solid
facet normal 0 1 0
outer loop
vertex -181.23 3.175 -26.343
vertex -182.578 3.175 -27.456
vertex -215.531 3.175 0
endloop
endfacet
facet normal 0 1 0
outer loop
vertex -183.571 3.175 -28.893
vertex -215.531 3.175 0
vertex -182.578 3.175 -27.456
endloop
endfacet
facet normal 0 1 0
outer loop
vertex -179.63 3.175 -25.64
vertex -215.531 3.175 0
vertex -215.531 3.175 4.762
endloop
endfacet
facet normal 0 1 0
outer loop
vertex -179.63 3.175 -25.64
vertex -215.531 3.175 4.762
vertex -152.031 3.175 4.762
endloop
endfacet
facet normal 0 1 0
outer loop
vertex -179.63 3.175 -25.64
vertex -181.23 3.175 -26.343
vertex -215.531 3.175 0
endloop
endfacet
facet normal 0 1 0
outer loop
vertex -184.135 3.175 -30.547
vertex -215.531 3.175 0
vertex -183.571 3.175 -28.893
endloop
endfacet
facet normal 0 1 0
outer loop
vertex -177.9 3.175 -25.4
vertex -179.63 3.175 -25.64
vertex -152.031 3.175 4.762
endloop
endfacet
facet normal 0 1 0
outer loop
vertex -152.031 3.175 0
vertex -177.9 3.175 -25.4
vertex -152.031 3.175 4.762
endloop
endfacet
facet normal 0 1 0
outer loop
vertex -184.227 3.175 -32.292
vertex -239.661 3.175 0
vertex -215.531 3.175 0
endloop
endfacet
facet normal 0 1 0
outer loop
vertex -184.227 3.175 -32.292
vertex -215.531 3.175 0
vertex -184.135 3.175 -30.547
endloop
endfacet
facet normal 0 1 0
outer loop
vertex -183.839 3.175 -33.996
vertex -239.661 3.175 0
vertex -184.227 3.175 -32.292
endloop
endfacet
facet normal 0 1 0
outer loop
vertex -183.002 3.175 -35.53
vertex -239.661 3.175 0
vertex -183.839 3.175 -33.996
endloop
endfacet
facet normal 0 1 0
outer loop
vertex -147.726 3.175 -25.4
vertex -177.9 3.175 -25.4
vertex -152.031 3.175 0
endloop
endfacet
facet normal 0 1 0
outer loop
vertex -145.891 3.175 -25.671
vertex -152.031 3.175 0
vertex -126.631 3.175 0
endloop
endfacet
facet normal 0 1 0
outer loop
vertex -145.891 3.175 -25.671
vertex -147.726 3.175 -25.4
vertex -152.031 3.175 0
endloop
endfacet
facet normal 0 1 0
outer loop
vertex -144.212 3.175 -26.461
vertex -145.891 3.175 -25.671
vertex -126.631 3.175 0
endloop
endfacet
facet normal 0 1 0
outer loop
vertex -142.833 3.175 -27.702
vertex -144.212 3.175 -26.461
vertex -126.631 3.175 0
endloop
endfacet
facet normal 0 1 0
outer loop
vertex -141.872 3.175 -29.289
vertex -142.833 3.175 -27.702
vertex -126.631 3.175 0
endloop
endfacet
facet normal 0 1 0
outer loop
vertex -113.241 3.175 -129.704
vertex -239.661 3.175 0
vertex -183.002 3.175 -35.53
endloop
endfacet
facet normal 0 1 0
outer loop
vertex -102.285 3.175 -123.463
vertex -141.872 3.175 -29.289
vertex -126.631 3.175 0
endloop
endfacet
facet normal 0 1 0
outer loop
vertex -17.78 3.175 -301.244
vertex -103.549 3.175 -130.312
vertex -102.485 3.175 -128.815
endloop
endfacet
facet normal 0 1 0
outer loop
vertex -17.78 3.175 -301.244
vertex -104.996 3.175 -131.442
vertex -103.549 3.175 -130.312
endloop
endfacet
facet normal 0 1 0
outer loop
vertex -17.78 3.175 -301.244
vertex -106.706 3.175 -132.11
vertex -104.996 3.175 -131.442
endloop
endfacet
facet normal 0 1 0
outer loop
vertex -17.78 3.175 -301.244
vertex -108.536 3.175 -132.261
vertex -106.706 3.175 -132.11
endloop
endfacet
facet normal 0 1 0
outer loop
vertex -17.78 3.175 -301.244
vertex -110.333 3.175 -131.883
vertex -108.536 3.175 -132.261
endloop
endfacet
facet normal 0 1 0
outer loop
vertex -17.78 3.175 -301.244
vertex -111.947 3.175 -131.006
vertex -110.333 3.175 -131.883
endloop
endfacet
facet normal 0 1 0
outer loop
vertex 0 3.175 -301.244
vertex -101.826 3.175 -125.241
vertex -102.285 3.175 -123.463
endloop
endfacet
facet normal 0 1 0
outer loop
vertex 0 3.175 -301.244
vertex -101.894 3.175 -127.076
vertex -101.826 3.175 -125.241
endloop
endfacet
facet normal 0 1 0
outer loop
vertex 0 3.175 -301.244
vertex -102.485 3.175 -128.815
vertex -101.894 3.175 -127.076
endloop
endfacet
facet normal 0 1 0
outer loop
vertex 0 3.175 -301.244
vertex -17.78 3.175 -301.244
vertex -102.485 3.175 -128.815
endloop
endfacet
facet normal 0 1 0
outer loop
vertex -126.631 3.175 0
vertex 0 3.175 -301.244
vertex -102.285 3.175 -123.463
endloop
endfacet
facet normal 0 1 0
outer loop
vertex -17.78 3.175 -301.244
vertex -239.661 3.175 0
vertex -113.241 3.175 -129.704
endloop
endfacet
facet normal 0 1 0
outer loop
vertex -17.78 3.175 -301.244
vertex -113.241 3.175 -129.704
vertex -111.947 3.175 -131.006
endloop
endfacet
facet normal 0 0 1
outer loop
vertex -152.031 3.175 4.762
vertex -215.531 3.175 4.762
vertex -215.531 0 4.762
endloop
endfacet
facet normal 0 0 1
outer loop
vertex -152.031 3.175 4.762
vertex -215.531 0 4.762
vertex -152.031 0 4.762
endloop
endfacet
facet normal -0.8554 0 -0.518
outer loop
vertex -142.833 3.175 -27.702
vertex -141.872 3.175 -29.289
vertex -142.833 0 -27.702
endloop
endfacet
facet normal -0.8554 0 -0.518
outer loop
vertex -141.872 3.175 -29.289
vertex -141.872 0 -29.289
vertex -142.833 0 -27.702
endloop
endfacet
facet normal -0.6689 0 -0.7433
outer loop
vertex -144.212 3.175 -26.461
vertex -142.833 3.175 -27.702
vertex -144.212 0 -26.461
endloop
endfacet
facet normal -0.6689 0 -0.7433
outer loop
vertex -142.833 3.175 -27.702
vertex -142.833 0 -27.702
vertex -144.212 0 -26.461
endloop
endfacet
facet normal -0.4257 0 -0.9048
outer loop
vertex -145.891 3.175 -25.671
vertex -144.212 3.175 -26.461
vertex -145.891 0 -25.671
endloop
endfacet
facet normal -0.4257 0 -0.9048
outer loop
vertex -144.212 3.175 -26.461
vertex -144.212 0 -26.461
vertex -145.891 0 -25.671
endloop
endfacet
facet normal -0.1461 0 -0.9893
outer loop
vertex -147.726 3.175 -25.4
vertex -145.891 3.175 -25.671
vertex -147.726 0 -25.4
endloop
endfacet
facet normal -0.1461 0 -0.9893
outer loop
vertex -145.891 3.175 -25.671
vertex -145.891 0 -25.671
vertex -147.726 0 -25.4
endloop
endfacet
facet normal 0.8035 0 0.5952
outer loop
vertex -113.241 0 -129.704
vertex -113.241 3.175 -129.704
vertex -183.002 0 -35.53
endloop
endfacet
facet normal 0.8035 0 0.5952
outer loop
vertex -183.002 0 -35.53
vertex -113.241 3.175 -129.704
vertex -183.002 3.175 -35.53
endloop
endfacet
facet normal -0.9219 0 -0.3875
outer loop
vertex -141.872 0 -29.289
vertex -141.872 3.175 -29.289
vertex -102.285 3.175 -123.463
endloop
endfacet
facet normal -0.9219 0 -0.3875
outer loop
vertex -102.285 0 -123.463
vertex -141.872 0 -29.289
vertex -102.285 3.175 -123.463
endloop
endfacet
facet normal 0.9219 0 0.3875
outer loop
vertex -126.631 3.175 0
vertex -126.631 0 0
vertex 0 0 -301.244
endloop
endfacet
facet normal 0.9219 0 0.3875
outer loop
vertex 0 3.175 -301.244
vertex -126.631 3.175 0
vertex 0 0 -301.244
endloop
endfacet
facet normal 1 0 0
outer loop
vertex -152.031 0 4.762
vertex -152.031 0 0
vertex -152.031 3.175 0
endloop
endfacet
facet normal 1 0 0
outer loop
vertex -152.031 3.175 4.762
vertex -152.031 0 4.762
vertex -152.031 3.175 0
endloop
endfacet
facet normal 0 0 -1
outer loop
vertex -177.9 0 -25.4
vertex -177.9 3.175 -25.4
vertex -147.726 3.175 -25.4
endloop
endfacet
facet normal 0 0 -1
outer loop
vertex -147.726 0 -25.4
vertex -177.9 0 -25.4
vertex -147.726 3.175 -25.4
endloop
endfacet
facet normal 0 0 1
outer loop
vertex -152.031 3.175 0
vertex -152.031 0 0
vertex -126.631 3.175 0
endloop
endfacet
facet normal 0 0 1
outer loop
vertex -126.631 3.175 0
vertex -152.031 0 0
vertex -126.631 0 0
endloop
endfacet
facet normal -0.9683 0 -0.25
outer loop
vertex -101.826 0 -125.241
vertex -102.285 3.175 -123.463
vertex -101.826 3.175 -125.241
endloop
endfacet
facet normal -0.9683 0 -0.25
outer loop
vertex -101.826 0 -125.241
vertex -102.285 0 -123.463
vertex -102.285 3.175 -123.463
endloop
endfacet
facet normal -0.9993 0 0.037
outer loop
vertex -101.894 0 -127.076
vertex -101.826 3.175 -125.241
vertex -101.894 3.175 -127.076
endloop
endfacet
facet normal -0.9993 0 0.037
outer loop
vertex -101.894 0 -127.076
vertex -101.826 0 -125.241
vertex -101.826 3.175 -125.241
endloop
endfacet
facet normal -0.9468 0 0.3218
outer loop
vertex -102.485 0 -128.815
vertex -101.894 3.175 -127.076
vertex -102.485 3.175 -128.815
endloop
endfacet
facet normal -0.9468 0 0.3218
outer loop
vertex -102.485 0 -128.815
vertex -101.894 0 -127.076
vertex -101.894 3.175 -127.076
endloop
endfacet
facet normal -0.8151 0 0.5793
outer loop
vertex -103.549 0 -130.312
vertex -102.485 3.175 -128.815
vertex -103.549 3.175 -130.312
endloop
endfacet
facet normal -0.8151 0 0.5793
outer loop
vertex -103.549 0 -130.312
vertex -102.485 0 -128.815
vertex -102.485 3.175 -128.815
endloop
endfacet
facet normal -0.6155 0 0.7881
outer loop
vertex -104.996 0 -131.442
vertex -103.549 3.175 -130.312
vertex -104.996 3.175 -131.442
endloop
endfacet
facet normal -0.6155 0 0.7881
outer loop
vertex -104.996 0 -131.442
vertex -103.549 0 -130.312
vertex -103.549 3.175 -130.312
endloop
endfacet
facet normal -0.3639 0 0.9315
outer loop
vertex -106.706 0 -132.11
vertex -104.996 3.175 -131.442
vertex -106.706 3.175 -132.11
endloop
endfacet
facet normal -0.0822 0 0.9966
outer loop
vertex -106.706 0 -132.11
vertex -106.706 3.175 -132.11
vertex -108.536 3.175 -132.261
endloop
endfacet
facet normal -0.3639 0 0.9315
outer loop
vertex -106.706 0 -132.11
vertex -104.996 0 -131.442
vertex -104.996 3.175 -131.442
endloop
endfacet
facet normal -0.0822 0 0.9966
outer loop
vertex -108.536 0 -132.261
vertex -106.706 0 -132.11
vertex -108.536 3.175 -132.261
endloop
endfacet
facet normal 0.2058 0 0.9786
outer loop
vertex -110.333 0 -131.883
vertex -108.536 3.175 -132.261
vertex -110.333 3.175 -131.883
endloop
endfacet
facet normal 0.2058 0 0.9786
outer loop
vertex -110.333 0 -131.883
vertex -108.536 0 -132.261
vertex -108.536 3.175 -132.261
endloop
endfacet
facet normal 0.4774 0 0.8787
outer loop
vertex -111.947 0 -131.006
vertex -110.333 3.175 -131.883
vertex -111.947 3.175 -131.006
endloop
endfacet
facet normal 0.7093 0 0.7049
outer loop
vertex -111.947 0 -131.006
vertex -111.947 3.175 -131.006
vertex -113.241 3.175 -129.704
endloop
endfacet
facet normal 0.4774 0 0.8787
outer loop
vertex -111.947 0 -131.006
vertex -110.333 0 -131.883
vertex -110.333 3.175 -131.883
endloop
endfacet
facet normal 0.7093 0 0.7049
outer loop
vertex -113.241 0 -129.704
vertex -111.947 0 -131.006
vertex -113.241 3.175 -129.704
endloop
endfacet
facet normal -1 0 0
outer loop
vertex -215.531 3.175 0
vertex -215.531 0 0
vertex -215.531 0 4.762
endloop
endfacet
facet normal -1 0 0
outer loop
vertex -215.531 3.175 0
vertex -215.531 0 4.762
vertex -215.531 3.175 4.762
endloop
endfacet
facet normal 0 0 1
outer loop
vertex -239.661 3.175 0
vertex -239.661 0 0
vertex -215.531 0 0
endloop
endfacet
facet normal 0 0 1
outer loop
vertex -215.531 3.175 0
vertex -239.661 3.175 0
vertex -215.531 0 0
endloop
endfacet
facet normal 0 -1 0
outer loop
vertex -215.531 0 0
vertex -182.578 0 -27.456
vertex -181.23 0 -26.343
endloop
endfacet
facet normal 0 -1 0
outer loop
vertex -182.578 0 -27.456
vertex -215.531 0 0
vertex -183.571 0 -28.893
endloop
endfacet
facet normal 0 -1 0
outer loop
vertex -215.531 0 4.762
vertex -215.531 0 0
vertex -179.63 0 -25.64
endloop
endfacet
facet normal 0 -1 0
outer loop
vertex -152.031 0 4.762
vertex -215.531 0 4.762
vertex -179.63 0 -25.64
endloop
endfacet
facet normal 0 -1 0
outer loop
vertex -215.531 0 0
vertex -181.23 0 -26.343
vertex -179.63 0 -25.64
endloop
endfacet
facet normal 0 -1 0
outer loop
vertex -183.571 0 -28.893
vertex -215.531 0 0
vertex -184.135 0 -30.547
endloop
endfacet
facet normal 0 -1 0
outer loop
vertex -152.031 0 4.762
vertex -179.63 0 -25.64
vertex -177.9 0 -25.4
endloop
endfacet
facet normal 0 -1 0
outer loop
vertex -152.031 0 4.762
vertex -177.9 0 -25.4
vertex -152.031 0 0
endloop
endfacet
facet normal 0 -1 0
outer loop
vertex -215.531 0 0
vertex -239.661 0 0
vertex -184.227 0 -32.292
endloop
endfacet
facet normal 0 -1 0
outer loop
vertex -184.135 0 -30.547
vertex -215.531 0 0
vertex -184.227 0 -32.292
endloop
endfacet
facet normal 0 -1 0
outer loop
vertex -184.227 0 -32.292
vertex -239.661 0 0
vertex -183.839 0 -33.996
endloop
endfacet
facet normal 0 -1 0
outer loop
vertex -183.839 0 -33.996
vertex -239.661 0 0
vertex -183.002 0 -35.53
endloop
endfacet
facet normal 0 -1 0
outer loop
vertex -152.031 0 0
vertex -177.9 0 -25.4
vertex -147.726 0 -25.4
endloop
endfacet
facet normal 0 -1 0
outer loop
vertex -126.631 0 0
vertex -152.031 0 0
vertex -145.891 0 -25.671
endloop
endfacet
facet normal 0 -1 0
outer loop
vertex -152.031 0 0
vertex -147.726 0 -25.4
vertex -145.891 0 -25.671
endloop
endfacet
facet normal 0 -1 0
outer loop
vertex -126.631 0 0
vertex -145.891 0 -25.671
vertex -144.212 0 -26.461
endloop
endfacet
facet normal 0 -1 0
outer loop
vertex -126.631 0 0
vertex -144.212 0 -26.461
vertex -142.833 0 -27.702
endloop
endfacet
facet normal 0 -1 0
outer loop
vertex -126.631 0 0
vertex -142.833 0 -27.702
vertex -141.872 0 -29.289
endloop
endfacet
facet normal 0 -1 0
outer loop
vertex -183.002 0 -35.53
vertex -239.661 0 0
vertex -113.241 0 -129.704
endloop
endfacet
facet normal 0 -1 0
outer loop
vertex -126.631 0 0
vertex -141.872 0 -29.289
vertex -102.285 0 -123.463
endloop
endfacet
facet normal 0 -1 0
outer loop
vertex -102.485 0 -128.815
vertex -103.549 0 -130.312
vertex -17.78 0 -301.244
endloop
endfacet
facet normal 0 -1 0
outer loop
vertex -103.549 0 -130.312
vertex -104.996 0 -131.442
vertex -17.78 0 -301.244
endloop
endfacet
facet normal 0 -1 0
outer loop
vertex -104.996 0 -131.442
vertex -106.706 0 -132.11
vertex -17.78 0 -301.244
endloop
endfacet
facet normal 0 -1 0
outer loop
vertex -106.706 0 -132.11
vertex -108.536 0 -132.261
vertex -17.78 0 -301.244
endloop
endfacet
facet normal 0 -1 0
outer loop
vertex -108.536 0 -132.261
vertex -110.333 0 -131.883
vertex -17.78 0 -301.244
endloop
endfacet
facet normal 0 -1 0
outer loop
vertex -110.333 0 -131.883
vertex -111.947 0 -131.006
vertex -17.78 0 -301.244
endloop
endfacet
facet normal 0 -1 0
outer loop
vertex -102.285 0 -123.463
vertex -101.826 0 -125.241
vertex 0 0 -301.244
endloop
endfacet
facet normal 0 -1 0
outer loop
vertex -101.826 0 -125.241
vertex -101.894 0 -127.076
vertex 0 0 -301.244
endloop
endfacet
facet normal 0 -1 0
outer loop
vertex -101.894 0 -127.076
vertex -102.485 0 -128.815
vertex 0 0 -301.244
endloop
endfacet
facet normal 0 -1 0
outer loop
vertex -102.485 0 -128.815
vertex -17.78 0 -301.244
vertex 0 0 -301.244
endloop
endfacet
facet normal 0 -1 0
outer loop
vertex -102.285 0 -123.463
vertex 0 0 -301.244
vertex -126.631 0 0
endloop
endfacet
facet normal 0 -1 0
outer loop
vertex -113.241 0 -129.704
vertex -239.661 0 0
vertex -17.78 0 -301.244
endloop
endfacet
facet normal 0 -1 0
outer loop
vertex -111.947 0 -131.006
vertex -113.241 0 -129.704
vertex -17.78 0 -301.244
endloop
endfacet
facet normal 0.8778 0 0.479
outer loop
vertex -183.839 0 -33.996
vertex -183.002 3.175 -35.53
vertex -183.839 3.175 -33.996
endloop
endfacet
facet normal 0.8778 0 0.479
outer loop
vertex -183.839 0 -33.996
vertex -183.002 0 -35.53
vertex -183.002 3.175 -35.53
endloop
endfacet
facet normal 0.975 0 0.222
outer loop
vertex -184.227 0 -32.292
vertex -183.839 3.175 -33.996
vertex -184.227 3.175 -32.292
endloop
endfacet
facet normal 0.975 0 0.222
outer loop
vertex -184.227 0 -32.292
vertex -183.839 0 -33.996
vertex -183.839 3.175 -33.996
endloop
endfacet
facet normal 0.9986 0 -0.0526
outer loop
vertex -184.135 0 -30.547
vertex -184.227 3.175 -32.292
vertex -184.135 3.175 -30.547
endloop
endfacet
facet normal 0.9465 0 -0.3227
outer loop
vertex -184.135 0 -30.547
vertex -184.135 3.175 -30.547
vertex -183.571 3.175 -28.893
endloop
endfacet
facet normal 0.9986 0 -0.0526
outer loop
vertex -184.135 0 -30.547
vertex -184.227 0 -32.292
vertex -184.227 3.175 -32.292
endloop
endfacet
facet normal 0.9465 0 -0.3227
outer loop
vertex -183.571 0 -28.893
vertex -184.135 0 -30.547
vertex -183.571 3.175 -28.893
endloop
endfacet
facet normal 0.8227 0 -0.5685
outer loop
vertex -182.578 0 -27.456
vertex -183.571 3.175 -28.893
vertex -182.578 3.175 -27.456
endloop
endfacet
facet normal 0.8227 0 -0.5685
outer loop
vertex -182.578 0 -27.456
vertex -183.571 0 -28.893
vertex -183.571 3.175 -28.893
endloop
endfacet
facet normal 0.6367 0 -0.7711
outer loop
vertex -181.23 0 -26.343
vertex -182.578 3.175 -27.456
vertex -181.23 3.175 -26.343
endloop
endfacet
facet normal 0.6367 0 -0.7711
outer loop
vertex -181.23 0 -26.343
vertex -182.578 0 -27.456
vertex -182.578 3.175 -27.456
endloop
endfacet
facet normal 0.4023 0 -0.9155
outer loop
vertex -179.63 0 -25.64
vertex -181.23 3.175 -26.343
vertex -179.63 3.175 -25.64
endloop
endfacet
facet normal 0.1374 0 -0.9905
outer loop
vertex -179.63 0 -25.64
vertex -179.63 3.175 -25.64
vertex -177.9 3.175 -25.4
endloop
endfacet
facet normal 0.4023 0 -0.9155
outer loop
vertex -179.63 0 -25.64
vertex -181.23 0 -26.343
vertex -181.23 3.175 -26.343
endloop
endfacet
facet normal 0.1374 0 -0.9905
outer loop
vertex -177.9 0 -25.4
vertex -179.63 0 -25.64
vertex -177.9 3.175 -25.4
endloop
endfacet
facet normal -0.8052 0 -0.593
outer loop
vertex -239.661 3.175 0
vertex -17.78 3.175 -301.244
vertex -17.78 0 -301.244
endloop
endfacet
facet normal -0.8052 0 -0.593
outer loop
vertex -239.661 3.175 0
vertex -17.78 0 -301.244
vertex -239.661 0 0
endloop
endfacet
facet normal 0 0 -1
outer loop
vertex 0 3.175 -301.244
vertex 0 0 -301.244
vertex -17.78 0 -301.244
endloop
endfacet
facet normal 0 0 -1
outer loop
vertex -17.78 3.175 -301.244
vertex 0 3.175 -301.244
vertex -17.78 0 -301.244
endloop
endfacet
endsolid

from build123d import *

# Parameters (mm, degrees)
BOSS_EXTRUDE1_DEPTH = 3.175
CUT_EXTRUDE1_DEPTH  = 3.175
FILLET1_R           = 6.35
SKETCH3_W           = 63.5
SKETCH3_H           = 3.175
BOSS_EXTRUDE2_DEPTH = 4.7625
CUT_EXTRUDE2_DEPTH  = 386.753713985


with BuildPart() as part:
    # Sketch1 → Boss-Extrude1 (new body)
    with BuildSketch(Plane(origin=(0, 0, 0), x_dir=(1, 0, 0), z_dir=(0, 1, 0))):
        Polygon((0, 301.244), (-17.78, 301.244), (-240.931317375, 0), (-126.631317375, 0), align=None)
    extrude(amount=BOSS_EXTRUDE1_DEPTH)

    # Sketch2 → Cut-Extrude1 (cut)
    with BuildSketch(Plane(origin=(0, 3.175, 0), x_dir=(1, 0, 0), z_dir=(0, 1, 0))):
        Polygon((-143.507037027, 25.4), (-81.84578186, 172.086329549), (-190.506029632, 25.4), align=None)
    extrude(amount=-CUT_EXTRUDE1_DEPTH, mode=Mode.SUBTRACT)

    # Fillet1
    fillet1_edges = [part.edges().sort_by_distance(p)[0] for p in [
        (-143.507037027, 1.5875, -25.4),
        (-190.506029632, 1.5875, -25.4),
        (-81.84578186, 1.5875, -172.086329549),
    ]]
    fillet(fillet1_edges, radius=FILLET1_R)

    # Sketch3 → Boss-Extrude2 (add)
    with BuildSketch(Plane.XY):
        with Locations((-183.781317375, 1.5875)):
            Rectangle(SKETCH3_W, SKETCH3_H)
    extrude(amount=BOSS_EXTRUDE2_DEPTH)

    # Sketch4 → Cut-Extrude2 (cut, through all)
    with BuildSketch(Plane(origin=(0, 3.175, 0), x_dir=(1, 0, 0), z_dir=(0, 1, 0))):
        Polygon((-17.78, 301.244), (-239.661317375, 0), (-240.931317375, 0), align=None)
    extrude(amount=-CUT_EXTRUDE2_DEPTH, mode=Mode.SUBTRACT)


solid = part.part
